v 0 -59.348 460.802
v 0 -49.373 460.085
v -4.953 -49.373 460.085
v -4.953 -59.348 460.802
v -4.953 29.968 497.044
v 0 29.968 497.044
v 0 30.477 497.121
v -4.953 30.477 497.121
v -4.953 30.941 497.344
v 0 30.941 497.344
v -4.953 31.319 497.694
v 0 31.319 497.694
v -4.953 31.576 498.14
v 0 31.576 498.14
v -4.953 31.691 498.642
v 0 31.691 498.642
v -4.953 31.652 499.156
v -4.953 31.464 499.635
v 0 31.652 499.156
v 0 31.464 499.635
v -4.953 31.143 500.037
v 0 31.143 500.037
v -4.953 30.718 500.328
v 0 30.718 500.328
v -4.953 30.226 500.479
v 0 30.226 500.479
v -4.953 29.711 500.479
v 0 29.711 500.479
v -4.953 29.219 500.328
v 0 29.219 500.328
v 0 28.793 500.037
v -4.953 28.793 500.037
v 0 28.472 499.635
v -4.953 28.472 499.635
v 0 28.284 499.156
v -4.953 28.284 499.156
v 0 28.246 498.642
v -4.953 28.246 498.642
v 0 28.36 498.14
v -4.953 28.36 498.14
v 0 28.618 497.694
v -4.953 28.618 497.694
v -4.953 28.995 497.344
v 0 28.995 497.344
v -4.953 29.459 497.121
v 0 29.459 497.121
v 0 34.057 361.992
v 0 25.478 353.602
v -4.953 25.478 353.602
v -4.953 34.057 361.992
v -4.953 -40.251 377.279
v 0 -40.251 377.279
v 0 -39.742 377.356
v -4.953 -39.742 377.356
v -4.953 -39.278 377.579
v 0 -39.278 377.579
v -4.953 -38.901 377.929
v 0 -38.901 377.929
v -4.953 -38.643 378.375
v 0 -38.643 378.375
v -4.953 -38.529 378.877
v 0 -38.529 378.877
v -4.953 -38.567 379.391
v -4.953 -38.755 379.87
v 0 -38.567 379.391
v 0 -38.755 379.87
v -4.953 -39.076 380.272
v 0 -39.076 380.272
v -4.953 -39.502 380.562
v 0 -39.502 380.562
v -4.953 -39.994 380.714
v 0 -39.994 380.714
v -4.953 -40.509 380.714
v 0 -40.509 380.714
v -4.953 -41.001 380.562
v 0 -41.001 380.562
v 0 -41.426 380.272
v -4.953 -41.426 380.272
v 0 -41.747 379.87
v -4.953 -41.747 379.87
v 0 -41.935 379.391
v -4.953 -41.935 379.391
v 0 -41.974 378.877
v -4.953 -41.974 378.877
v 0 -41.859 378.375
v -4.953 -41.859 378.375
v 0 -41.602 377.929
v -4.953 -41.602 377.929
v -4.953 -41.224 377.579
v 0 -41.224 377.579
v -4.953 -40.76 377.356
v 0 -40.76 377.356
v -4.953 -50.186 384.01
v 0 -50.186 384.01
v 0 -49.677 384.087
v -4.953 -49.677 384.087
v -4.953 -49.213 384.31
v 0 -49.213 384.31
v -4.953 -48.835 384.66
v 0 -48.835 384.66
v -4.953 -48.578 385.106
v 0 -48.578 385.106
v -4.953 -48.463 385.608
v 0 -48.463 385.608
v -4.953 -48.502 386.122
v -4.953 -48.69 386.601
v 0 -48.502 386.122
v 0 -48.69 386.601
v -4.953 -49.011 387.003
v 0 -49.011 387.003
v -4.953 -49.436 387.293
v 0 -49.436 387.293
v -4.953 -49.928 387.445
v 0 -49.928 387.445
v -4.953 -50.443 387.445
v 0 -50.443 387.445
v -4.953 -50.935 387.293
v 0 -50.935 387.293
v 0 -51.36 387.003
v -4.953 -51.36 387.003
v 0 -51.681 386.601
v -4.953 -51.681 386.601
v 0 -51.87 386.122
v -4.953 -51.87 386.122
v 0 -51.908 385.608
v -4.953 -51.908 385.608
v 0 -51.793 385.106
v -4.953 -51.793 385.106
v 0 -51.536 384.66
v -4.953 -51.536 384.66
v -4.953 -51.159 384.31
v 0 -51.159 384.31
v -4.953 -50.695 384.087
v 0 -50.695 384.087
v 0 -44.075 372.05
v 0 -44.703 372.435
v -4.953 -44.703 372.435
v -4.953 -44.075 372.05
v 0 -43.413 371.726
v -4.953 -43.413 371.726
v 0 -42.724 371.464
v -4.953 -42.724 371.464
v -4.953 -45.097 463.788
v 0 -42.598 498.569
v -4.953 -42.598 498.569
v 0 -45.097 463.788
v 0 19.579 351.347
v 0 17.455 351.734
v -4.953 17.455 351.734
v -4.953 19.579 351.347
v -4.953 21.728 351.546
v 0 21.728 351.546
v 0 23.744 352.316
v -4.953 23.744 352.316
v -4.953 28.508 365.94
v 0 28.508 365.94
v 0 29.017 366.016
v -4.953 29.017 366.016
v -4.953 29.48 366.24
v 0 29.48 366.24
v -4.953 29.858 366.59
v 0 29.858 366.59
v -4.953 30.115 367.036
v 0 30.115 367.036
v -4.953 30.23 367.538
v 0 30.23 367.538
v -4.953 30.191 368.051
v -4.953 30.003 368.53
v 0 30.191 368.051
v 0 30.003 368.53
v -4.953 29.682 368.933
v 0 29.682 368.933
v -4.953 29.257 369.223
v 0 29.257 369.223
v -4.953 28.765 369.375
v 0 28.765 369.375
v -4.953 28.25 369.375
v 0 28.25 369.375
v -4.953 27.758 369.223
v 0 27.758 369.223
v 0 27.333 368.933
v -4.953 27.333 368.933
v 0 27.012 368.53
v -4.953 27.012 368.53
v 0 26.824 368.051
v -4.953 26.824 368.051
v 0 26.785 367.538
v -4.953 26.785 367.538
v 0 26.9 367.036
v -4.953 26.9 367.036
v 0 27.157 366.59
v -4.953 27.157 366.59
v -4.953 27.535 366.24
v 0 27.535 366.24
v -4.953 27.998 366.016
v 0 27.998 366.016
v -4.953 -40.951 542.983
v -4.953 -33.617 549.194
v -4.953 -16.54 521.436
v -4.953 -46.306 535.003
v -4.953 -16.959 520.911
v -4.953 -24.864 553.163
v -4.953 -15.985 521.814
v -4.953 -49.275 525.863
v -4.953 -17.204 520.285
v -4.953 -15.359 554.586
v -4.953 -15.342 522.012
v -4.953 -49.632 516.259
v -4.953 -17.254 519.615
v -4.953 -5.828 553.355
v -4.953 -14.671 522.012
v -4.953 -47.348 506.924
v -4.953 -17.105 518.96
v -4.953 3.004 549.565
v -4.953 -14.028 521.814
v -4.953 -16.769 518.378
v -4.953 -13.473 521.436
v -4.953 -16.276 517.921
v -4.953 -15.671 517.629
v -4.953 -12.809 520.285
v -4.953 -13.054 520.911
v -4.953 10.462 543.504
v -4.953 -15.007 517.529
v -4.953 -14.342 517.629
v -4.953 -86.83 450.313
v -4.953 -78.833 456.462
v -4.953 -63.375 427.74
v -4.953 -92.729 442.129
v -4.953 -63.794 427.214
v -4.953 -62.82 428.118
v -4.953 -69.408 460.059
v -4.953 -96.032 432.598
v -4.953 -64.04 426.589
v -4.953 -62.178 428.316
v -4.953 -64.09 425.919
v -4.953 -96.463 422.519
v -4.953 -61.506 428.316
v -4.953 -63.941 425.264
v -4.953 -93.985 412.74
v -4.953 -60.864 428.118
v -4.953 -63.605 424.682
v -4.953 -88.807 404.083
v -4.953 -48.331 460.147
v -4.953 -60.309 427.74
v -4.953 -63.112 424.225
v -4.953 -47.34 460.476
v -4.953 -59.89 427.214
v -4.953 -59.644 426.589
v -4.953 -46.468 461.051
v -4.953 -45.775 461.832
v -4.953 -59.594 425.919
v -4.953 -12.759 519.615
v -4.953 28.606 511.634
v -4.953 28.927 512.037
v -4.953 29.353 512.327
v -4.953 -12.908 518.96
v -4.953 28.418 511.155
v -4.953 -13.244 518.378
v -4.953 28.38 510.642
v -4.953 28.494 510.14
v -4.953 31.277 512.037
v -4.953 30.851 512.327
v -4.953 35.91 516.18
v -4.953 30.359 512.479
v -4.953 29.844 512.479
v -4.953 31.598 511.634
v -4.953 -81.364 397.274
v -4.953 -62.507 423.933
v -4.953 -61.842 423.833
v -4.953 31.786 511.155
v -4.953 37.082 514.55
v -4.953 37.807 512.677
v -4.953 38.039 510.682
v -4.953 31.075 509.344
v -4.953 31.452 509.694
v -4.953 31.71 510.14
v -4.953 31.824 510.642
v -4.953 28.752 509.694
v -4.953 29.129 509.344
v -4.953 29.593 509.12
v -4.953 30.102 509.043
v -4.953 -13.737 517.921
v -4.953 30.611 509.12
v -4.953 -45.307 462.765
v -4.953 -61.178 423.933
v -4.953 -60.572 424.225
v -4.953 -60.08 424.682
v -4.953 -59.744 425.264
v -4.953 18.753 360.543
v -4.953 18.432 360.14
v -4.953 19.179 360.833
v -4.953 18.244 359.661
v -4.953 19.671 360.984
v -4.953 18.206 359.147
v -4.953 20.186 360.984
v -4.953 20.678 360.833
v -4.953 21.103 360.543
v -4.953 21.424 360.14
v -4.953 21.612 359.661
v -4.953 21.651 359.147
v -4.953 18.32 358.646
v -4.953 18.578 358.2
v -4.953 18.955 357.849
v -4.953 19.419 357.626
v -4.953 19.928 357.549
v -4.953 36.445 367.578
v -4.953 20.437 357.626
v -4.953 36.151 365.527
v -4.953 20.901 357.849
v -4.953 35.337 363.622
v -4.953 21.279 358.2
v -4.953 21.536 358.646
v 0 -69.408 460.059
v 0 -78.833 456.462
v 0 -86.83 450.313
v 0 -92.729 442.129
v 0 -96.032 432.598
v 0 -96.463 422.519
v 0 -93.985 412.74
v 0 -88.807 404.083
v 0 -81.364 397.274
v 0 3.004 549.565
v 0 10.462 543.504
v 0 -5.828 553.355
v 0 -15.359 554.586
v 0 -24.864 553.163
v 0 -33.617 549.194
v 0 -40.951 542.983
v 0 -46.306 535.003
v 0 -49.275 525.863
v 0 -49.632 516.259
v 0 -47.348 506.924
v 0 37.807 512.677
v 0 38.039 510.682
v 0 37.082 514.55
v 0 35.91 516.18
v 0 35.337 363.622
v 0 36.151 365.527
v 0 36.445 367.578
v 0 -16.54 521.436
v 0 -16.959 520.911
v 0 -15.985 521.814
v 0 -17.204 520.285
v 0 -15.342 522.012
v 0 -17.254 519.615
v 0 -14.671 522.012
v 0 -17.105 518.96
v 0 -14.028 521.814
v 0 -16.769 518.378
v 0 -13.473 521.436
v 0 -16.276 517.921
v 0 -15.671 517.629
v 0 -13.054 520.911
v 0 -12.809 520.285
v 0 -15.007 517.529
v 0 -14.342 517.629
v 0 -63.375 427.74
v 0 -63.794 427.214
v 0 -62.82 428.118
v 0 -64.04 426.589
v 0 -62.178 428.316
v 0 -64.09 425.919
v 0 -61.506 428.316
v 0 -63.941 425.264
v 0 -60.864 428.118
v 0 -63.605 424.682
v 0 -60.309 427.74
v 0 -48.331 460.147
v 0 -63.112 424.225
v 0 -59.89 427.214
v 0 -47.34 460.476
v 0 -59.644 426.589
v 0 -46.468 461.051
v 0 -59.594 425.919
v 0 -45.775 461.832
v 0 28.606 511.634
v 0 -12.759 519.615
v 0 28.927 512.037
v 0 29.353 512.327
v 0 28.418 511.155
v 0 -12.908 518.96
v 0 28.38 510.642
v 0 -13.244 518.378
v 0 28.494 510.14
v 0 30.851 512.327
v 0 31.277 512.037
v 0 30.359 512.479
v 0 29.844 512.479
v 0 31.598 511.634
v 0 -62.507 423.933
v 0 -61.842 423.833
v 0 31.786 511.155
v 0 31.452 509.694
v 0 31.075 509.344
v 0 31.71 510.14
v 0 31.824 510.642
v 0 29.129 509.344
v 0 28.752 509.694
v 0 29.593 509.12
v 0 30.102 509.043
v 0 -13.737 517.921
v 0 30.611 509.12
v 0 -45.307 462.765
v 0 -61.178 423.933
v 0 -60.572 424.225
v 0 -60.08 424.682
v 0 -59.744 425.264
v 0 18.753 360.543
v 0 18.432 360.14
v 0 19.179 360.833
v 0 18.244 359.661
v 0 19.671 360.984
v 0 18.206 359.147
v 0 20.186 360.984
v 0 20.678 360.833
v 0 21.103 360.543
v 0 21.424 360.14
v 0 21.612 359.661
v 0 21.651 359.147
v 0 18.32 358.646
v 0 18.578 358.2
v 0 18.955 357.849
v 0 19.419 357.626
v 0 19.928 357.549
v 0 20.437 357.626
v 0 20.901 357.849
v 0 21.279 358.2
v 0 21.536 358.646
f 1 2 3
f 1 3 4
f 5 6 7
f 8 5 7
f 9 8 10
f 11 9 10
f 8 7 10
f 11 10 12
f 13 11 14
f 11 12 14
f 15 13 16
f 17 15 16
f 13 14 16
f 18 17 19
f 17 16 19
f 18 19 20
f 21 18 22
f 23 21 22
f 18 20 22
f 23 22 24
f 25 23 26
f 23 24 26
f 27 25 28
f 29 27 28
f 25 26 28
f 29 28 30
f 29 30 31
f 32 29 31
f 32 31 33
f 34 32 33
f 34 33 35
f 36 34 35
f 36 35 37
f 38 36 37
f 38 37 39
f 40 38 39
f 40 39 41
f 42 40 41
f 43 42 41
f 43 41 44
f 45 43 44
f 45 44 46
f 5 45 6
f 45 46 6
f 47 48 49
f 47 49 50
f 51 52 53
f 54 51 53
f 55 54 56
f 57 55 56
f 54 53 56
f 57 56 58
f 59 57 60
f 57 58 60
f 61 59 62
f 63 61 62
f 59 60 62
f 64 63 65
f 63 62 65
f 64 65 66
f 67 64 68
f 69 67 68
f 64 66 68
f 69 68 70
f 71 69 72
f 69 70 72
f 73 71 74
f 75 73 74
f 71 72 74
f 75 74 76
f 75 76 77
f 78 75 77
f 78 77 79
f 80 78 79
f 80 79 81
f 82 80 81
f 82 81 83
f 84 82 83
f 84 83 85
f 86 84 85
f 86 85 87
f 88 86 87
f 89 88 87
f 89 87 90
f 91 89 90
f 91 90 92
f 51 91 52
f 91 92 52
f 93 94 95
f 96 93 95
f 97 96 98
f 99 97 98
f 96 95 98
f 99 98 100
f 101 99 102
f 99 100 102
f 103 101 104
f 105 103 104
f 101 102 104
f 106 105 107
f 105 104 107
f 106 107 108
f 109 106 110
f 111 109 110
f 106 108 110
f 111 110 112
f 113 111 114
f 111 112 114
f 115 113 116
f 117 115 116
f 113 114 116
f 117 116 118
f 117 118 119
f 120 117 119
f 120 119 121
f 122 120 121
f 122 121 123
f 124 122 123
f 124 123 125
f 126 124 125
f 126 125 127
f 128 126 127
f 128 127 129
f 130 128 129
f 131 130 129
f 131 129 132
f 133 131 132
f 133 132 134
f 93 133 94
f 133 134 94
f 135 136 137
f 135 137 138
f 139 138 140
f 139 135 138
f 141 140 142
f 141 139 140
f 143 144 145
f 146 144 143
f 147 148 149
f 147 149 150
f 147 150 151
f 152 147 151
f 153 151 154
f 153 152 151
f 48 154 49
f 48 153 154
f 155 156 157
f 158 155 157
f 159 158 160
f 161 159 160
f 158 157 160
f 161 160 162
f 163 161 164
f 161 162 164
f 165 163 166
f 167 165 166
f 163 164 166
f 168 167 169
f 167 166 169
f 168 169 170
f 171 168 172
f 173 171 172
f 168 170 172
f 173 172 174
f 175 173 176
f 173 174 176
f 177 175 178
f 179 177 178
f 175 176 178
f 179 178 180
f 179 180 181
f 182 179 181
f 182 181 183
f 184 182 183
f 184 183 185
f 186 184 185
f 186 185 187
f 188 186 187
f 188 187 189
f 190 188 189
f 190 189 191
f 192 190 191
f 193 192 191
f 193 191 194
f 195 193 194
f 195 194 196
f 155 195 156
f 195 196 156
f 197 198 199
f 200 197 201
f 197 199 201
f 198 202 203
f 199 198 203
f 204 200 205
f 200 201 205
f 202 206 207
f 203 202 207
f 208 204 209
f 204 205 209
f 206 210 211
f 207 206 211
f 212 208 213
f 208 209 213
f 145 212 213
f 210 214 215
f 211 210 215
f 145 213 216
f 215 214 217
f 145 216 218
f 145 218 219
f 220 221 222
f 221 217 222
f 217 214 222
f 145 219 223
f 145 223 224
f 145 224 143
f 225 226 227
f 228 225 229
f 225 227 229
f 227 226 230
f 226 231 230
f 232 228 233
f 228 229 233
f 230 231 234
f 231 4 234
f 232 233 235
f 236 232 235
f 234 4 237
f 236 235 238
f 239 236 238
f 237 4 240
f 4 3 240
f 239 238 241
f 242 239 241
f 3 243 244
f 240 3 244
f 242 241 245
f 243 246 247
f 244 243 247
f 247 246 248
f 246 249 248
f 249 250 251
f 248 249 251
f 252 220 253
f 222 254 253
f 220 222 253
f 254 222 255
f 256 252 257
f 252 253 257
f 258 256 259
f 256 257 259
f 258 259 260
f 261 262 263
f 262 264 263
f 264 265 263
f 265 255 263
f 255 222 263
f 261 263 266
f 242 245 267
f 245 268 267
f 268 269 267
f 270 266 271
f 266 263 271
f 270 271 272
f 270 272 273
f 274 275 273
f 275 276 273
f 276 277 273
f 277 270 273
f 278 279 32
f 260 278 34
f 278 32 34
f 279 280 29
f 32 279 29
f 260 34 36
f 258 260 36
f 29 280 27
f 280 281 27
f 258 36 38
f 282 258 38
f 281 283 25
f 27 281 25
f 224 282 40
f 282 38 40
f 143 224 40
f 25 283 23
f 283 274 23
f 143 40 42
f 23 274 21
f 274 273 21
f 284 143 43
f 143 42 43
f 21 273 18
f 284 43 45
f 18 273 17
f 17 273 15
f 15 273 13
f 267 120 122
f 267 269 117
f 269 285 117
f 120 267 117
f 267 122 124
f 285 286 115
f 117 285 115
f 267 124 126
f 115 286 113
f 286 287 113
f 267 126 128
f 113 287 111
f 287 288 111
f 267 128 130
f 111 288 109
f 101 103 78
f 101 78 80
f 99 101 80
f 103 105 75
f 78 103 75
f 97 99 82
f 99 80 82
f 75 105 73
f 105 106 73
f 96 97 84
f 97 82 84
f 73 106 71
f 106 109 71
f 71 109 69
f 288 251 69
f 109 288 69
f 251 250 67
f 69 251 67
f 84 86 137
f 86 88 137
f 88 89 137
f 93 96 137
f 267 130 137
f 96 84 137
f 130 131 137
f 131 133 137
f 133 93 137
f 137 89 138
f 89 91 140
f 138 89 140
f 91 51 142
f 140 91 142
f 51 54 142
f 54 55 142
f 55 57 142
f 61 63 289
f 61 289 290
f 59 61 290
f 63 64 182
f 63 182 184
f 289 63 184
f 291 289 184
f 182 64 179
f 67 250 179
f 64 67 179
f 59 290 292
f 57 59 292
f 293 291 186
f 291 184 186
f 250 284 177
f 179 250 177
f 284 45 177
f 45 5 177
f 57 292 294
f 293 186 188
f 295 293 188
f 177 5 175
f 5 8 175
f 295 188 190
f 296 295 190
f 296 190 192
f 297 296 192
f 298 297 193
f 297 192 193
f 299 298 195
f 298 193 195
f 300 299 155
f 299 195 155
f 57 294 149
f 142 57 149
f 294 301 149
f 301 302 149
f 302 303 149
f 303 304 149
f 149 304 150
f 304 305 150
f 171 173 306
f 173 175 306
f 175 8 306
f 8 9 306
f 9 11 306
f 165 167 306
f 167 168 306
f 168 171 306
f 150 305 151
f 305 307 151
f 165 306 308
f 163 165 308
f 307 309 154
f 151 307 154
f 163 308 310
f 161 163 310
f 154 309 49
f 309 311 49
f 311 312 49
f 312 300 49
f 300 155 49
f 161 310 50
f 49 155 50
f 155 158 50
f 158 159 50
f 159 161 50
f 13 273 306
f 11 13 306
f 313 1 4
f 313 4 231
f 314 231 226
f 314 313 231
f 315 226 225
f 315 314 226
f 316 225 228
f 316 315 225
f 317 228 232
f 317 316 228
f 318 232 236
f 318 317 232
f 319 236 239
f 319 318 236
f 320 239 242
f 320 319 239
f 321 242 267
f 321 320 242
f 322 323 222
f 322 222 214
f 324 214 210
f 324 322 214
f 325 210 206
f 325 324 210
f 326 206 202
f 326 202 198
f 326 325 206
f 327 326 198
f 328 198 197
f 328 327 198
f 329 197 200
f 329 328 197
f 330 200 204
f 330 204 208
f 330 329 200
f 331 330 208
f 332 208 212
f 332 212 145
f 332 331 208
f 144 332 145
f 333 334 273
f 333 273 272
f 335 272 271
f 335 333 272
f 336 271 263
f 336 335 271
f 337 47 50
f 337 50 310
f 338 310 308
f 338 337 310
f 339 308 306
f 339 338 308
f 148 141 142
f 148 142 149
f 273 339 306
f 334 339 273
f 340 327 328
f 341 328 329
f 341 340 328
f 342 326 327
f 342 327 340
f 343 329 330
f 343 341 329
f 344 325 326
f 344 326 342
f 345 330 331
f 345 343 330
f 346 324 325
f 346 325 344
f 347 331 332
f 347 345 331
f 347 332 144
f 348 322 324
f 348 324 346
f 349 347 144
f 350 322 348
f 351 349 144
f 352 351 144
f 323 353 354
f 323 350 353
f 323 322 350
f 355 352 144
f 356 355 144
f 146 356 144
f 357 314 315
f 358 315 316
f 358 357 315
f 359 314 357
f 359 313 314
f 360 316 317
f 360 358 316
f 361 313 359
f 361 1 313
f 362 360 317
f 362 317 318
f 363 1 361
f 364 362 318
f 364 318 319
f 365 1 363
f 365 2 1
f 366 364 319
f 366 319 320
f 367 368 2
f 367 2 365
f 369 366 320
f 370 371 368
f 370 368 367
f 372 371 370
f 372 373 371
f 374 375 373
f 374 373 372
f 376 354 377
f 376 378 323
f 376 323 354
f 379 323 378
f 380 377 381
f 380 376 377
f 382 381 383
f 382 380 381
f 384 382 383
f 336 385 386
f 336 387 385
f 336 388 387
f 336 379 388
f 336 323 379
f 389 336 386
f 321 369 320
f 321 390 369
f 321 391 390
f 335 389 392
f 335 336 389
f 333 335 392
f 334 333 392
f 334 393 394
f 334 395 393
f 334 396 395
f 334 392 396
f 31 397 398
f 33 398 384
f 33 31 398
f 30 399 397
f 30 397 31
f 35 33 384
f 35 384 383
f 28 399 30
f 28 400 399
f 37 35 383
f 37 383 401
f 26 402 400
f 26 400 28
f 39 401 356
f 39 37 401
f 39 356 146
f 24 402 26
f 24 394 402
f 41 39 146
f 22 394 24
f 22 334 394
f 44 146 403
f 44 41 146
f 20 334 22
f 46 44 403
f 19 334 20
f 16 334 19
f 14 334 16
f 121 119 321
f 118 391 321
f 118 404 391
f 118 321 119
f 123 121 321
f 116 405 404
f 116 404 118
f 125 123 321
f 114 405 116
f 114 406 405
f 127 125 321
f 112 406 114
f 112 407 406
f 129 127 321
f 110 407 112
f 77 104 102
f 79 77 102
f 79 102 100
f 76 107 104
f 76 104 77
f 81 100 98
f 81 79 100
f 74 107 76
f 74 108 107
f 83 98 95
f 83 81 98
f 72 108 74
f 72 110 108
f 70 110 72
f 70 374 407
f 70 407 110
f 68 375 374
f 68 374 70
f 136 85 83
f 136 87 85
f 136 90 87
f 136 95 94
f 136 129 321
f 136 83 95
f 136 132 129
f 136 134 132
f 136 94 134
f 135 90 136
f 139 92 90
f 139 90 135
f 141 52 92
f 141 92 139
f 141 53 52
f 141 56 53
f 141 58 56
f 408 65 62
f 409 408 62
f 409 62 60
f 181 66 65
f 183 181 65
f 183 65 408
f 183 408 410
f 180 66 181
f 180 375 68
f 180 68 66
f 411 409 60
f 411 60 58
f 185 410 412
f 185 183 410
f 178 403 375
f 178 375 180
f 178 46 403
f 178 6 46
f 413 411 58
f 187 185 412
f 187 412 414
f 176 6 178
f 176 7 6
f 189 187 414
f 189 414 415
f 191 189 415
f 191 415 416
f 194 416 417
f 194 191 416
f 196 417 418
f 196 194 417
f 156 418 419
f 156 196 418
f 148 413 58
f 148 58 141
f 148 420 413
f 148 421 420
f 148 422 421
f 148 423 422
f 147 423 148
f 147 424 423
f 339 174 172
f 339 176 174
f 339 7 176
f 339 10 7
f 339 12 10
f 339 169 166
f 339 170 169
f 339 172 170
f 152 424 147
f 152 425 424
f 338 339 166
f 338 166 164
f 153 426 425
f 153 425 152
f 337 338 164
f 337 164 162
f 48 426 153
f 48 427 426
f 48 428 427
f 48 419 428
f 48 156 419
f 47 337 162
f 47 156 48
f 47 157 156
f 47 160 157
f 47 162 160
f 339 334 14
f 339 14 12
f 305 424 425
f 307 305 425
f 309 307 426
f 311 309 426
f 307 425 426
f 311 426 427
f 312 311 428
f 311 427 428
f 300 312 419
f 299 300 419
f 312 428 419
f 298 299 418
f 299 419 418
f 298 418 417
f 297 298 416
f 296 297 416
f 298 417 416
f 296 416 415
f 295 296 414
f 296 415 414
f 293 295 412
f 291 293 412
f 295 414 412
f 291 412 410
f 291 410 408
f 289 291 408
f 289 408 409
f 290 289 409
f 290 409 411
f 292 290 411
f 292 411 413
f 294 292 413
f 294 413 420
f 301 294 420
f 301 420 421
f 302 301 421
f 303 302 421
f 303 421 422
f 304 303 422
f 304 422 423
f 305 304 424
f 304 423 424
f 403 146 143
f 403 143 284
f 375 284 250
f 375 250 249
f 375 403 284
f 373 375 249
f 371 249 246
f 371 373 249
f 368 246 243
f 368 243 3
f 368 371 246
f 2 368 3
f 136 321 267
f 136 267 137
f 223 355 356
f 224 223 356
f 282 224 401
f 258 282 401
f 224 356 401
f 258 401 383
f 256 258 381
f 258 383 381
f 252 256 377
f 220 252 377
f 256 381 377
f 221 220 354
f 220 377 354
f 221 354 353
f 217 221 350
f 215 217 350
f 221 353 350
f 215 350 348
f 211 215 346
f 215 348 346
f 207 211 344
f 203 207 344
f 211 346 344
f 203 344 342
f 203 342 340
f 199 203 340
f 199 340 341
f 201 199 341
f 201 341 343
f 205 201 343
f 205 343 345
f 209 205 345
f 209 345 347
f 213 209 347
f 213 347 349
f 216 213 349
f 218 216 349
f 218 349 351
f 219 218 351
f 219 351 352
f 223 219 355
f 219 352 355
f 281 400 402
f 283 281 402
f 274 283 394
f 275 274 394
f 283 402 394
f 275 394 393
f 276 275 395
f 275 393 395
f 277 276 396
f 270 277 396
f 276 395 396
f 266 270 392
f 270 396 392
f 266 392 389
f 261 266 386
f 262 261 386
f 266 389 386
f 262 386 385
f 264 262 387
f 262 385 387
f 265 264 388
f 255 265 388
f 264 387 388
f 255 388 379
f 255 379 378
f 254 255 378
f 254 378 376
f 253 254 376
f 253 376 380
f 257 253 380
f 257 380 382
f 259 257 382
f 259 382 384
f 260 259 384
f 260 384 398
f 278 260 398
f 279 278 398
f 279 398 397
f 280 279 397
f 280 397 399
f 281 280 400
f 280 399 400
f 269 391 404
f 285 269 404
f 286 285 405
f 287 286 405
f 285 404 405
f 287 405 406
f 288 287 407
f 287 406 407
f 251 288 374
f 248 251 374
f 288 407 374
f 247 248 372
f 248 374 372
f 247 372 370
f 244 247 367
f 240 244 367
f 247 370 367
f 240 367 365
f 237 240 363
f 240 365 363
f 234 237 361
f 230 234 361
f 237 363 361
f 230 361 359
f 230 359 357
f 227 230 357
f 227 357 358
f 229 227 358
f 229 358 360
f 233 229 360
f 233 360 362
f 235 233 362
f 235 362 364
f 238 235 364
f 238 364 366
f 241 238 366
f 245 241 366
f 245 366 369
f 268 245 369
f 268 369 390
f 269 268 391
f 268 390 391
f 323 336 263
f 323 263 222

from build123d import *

# Parameters (mm, degrees)
SKETCH1_R           = 1.7272
SKETCH1_R_2         = 2.25425
BOSS_EXTRUDE1_DEPTH = 4.953


with BuildPart() as part:
    # Sketch1 → Boss-Extrude1 (new body)
    with BuildSketch(Plane(origin=(0, 0, 0), x_dir=(0, 0, -1), z_dir=(1, 0, 0))):
        with BuildLine():
            Line((-353.601711985, 25.477997798), (-361.991932565, 34.057286733))
            ThreePointArc((-361.991932565, 34.057286733), (-364.547713568, 35.80650286), (-367.578343358, 36.444512791))
            Line((-367.578343358, 36.444512791), (-510.682190934, 38.038925927))
            ThreePointArc((-510.682190934, 38.038925927), (-513.636251412, 37.504085531), (-516.180391889, 35.910386439))
            Line((-516.180391889, 35.910386439), (-543.504008498, 10.46228671))
            ThreePointArc((-543.504008498, 10.46228671), (-546.343088738, -37.498931011), (-498.569252083, -42.597883175))
            Line((-498.569252083, -42.597883175), (-463.788130796, -45.097087093))
            ThreePointArc((-463.788130796, -45.097087093), (-461.050944436, -46.468361622), (-460.085098917, -49.373482176))
            Line((-460.085098917, -49.373482176), (-460.801802922, -59.347765878))
            ThreePointArc((-460.801802922, -59.347765878), (-437.483960059, -94.727435258), (-397.273694981, -81.364150349))
            Line((-397.273694981, -81.364150349), (-372.43498101, -44.703357168))
            ThreePointArc((-372.43498101, -44.703357168), (-371.88030639, -43.747530325), (-371.463761272, -42.723929302))
            Line((-371.463761272, -42.723929302), (-351.734061333, 17.455422825))
            ThreePointArc((-351.734061333, 17.455422825), (-351.545777131, 21.727936738), (-353.601711985, 25.477997798))
        make_face()
        with Locations((-359.276554144, 19.928216477)):
            Circle(SKETCH1_R, mode=Mode.SUBTRACT)
        with Locations((-367.666774725, 28.507505411)):
            Circle(SKETCH1_R, mode=Mode.SUBTRACT)
        with Locations((-510.7706223, 30.101918548)):
            Circle(SKETCH1_R, mode=Mode.SUBTRACT)
        with Locations((-379.006254083, -40.251135649)):
            Circle(SKETCH1_R, mode=Mode.SUBTRACT)
        with Locations((-426.087206182, -61.842189663)):
            Circle(SKETCH1_R_2, mode=Mode.SUBTRACT)
        with Locations((-519.783421193, -15.006500358)):
            Circle(SKETCH1_R_2, mode=Mode.SUBTRACT)
        with Locations((-385.737171654, -50.185658721)):
            Circle(SKETCH1_R, mode=Mode.SUBTRACT)
        with Locations((-498.771367049, 29.968227033)):
            Circle(SKETCH1_R, mode=Mode.SUBTRACT)
    extrude(amount=-BOSS_EXTRUDE1_DEPTH)


solid = part.part
